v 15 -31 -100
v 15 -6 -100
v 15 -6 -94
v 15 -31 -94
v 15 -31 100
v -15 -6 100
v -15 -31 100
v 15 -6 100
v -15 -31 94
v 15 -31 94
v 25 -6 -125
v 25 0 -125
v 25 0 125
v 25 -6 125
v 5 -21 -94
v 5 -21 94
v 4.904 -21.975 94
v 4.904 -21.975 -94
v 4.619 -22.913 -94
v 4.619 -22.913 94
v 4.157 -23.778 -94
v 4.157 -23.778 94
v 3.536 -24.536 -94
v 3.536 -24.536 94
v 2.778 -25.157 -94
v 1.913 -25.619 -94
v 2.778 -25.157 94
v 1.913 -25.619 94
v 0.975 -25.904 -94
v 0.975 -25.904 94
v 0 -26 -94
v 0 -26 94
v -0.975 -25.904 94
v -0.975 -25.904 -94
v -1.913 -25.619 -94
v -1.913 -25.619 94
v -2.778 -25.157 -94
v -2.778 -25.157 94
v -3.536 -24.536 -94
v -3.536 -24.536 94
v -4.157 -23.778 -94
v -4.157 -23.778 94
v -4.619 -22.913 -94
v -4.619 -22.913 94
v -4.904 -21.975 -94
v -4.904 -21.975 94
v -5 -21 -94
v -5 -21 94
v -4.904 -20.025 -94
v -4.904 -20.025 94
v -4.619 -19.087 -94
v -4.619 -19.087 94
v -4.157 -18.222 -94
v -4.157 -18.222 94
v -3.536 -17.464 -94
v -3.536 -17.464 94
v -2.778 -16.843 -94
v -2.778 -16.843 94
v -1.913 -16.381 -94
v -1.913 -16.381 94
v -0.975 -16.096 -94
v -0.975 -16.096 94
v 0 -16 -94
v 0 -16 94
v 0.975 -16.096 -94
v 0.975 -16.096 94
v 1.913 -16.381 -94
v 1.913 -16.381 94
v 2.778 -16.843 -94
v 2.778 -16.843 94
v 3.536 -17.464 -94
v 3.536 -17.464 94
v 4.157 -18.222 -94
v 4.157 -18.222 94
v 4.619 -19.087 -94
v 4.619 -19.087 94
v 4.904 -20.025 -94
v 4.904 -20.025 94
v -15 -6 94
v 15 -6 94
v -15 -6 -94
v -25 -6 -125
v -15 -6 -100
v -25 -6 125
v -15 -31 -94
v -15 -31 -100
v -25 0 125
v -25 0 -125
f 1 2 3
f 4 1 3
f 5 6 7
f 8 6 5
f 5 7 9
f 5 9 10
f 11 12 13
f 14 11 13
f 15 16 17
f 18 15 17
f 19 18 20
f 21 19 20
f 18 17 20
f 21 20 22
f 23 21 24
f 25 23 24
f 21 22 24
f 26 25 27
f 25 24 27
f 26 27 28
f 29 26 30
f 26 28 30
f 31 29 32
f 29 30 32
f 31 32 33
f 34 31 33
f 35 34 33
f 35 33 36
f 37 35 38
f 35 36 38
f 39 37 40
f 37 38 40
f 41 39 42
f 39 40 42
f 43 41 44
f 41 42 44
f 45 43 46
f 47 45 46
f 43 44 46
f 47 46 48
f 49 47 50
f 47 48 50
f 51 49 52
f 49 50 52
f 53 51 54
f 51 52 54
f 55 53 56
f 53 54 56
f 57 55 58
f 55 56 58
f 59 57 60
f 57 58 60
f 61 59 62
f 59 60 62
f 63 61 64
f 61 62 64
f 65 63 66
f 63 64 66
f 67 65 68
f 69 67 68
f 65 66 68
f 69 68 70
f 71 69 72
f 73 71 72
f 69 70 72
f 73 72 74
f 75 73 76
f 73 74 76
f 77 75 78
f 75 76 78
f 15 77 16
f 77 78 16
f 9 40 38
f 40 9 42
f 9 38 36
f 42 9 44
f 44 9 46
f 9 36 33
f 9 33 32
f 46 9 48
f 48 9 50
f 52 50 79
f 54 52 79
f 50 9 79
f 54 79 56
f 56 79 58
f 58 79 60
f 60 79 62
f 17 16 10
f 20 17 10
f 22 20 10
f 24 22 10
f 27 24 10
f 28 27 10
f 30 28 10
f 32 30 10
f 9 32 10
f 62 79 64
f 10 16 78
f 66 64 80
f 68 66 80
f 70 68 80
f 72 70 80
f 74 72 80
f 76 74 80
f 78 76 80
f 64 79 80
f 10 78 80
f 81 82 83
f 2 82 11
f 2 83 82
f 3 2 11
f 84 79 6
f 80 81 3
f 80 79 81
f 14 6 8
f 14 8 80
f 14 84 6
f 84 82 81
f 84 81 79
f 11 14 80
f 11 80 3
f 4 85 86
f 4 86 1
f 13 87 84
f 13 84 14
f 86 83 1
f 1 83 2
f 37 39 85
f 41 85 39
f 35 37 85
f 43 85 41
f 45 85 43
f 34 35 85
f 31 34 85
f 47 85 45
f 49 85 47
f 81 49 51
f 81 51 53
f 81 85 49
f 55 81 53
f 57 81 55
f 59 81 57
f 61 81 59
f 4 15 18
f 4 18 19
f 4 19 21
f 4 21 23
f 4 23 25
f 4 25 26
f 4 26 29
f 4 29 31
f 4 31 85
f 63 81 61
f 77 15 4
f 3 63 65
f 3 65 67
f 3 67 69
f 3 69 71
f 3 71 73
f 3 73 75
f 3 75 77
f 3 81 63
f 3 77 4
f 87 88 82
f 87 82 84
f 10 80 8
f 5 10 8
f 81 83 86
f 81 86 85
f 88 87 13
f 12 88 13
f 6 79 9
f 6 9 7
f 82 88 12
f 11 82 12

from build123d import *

# Parameters (mm, degrees)
F0_W     = 50
F0_H     = 250
F1_DEPTH = 6
F2_W     = 30
F2_H     = 6
F3_DEPTH = 25
F4_R     = 5
F5_DEPTH = 188


with BuildPart() as f1:
    # F0 (on Front) → F1 (new body)
    with BuildSketch(Plane.XZ):
        Rectangle(F0_W, F0_H)
    extrude(amount=F1_DEPTH)

    # F2 (on face) → F3 (join)
    with BuildSketch(Plane.XZ.offset(6)):
        with Locations((0, 97)):
            Rectangle(F2_W, F2_H)
        with Locations((0, -97)):
            Rectangle(F2_W, F2_H)
    extrude(amount=F3_DEPTH)

    # F4 (on face) → F5 (join, through all)
    with BuildSketch(Plane(origin=(0, 0, 94), x_dir=(1, 0, 0), z_dir=(0, 0, -1))):
        with Locations((0, 21)):
            Circle(F4_R)
    extrude(amount=F5_DEPTH)


solid = f1.part
